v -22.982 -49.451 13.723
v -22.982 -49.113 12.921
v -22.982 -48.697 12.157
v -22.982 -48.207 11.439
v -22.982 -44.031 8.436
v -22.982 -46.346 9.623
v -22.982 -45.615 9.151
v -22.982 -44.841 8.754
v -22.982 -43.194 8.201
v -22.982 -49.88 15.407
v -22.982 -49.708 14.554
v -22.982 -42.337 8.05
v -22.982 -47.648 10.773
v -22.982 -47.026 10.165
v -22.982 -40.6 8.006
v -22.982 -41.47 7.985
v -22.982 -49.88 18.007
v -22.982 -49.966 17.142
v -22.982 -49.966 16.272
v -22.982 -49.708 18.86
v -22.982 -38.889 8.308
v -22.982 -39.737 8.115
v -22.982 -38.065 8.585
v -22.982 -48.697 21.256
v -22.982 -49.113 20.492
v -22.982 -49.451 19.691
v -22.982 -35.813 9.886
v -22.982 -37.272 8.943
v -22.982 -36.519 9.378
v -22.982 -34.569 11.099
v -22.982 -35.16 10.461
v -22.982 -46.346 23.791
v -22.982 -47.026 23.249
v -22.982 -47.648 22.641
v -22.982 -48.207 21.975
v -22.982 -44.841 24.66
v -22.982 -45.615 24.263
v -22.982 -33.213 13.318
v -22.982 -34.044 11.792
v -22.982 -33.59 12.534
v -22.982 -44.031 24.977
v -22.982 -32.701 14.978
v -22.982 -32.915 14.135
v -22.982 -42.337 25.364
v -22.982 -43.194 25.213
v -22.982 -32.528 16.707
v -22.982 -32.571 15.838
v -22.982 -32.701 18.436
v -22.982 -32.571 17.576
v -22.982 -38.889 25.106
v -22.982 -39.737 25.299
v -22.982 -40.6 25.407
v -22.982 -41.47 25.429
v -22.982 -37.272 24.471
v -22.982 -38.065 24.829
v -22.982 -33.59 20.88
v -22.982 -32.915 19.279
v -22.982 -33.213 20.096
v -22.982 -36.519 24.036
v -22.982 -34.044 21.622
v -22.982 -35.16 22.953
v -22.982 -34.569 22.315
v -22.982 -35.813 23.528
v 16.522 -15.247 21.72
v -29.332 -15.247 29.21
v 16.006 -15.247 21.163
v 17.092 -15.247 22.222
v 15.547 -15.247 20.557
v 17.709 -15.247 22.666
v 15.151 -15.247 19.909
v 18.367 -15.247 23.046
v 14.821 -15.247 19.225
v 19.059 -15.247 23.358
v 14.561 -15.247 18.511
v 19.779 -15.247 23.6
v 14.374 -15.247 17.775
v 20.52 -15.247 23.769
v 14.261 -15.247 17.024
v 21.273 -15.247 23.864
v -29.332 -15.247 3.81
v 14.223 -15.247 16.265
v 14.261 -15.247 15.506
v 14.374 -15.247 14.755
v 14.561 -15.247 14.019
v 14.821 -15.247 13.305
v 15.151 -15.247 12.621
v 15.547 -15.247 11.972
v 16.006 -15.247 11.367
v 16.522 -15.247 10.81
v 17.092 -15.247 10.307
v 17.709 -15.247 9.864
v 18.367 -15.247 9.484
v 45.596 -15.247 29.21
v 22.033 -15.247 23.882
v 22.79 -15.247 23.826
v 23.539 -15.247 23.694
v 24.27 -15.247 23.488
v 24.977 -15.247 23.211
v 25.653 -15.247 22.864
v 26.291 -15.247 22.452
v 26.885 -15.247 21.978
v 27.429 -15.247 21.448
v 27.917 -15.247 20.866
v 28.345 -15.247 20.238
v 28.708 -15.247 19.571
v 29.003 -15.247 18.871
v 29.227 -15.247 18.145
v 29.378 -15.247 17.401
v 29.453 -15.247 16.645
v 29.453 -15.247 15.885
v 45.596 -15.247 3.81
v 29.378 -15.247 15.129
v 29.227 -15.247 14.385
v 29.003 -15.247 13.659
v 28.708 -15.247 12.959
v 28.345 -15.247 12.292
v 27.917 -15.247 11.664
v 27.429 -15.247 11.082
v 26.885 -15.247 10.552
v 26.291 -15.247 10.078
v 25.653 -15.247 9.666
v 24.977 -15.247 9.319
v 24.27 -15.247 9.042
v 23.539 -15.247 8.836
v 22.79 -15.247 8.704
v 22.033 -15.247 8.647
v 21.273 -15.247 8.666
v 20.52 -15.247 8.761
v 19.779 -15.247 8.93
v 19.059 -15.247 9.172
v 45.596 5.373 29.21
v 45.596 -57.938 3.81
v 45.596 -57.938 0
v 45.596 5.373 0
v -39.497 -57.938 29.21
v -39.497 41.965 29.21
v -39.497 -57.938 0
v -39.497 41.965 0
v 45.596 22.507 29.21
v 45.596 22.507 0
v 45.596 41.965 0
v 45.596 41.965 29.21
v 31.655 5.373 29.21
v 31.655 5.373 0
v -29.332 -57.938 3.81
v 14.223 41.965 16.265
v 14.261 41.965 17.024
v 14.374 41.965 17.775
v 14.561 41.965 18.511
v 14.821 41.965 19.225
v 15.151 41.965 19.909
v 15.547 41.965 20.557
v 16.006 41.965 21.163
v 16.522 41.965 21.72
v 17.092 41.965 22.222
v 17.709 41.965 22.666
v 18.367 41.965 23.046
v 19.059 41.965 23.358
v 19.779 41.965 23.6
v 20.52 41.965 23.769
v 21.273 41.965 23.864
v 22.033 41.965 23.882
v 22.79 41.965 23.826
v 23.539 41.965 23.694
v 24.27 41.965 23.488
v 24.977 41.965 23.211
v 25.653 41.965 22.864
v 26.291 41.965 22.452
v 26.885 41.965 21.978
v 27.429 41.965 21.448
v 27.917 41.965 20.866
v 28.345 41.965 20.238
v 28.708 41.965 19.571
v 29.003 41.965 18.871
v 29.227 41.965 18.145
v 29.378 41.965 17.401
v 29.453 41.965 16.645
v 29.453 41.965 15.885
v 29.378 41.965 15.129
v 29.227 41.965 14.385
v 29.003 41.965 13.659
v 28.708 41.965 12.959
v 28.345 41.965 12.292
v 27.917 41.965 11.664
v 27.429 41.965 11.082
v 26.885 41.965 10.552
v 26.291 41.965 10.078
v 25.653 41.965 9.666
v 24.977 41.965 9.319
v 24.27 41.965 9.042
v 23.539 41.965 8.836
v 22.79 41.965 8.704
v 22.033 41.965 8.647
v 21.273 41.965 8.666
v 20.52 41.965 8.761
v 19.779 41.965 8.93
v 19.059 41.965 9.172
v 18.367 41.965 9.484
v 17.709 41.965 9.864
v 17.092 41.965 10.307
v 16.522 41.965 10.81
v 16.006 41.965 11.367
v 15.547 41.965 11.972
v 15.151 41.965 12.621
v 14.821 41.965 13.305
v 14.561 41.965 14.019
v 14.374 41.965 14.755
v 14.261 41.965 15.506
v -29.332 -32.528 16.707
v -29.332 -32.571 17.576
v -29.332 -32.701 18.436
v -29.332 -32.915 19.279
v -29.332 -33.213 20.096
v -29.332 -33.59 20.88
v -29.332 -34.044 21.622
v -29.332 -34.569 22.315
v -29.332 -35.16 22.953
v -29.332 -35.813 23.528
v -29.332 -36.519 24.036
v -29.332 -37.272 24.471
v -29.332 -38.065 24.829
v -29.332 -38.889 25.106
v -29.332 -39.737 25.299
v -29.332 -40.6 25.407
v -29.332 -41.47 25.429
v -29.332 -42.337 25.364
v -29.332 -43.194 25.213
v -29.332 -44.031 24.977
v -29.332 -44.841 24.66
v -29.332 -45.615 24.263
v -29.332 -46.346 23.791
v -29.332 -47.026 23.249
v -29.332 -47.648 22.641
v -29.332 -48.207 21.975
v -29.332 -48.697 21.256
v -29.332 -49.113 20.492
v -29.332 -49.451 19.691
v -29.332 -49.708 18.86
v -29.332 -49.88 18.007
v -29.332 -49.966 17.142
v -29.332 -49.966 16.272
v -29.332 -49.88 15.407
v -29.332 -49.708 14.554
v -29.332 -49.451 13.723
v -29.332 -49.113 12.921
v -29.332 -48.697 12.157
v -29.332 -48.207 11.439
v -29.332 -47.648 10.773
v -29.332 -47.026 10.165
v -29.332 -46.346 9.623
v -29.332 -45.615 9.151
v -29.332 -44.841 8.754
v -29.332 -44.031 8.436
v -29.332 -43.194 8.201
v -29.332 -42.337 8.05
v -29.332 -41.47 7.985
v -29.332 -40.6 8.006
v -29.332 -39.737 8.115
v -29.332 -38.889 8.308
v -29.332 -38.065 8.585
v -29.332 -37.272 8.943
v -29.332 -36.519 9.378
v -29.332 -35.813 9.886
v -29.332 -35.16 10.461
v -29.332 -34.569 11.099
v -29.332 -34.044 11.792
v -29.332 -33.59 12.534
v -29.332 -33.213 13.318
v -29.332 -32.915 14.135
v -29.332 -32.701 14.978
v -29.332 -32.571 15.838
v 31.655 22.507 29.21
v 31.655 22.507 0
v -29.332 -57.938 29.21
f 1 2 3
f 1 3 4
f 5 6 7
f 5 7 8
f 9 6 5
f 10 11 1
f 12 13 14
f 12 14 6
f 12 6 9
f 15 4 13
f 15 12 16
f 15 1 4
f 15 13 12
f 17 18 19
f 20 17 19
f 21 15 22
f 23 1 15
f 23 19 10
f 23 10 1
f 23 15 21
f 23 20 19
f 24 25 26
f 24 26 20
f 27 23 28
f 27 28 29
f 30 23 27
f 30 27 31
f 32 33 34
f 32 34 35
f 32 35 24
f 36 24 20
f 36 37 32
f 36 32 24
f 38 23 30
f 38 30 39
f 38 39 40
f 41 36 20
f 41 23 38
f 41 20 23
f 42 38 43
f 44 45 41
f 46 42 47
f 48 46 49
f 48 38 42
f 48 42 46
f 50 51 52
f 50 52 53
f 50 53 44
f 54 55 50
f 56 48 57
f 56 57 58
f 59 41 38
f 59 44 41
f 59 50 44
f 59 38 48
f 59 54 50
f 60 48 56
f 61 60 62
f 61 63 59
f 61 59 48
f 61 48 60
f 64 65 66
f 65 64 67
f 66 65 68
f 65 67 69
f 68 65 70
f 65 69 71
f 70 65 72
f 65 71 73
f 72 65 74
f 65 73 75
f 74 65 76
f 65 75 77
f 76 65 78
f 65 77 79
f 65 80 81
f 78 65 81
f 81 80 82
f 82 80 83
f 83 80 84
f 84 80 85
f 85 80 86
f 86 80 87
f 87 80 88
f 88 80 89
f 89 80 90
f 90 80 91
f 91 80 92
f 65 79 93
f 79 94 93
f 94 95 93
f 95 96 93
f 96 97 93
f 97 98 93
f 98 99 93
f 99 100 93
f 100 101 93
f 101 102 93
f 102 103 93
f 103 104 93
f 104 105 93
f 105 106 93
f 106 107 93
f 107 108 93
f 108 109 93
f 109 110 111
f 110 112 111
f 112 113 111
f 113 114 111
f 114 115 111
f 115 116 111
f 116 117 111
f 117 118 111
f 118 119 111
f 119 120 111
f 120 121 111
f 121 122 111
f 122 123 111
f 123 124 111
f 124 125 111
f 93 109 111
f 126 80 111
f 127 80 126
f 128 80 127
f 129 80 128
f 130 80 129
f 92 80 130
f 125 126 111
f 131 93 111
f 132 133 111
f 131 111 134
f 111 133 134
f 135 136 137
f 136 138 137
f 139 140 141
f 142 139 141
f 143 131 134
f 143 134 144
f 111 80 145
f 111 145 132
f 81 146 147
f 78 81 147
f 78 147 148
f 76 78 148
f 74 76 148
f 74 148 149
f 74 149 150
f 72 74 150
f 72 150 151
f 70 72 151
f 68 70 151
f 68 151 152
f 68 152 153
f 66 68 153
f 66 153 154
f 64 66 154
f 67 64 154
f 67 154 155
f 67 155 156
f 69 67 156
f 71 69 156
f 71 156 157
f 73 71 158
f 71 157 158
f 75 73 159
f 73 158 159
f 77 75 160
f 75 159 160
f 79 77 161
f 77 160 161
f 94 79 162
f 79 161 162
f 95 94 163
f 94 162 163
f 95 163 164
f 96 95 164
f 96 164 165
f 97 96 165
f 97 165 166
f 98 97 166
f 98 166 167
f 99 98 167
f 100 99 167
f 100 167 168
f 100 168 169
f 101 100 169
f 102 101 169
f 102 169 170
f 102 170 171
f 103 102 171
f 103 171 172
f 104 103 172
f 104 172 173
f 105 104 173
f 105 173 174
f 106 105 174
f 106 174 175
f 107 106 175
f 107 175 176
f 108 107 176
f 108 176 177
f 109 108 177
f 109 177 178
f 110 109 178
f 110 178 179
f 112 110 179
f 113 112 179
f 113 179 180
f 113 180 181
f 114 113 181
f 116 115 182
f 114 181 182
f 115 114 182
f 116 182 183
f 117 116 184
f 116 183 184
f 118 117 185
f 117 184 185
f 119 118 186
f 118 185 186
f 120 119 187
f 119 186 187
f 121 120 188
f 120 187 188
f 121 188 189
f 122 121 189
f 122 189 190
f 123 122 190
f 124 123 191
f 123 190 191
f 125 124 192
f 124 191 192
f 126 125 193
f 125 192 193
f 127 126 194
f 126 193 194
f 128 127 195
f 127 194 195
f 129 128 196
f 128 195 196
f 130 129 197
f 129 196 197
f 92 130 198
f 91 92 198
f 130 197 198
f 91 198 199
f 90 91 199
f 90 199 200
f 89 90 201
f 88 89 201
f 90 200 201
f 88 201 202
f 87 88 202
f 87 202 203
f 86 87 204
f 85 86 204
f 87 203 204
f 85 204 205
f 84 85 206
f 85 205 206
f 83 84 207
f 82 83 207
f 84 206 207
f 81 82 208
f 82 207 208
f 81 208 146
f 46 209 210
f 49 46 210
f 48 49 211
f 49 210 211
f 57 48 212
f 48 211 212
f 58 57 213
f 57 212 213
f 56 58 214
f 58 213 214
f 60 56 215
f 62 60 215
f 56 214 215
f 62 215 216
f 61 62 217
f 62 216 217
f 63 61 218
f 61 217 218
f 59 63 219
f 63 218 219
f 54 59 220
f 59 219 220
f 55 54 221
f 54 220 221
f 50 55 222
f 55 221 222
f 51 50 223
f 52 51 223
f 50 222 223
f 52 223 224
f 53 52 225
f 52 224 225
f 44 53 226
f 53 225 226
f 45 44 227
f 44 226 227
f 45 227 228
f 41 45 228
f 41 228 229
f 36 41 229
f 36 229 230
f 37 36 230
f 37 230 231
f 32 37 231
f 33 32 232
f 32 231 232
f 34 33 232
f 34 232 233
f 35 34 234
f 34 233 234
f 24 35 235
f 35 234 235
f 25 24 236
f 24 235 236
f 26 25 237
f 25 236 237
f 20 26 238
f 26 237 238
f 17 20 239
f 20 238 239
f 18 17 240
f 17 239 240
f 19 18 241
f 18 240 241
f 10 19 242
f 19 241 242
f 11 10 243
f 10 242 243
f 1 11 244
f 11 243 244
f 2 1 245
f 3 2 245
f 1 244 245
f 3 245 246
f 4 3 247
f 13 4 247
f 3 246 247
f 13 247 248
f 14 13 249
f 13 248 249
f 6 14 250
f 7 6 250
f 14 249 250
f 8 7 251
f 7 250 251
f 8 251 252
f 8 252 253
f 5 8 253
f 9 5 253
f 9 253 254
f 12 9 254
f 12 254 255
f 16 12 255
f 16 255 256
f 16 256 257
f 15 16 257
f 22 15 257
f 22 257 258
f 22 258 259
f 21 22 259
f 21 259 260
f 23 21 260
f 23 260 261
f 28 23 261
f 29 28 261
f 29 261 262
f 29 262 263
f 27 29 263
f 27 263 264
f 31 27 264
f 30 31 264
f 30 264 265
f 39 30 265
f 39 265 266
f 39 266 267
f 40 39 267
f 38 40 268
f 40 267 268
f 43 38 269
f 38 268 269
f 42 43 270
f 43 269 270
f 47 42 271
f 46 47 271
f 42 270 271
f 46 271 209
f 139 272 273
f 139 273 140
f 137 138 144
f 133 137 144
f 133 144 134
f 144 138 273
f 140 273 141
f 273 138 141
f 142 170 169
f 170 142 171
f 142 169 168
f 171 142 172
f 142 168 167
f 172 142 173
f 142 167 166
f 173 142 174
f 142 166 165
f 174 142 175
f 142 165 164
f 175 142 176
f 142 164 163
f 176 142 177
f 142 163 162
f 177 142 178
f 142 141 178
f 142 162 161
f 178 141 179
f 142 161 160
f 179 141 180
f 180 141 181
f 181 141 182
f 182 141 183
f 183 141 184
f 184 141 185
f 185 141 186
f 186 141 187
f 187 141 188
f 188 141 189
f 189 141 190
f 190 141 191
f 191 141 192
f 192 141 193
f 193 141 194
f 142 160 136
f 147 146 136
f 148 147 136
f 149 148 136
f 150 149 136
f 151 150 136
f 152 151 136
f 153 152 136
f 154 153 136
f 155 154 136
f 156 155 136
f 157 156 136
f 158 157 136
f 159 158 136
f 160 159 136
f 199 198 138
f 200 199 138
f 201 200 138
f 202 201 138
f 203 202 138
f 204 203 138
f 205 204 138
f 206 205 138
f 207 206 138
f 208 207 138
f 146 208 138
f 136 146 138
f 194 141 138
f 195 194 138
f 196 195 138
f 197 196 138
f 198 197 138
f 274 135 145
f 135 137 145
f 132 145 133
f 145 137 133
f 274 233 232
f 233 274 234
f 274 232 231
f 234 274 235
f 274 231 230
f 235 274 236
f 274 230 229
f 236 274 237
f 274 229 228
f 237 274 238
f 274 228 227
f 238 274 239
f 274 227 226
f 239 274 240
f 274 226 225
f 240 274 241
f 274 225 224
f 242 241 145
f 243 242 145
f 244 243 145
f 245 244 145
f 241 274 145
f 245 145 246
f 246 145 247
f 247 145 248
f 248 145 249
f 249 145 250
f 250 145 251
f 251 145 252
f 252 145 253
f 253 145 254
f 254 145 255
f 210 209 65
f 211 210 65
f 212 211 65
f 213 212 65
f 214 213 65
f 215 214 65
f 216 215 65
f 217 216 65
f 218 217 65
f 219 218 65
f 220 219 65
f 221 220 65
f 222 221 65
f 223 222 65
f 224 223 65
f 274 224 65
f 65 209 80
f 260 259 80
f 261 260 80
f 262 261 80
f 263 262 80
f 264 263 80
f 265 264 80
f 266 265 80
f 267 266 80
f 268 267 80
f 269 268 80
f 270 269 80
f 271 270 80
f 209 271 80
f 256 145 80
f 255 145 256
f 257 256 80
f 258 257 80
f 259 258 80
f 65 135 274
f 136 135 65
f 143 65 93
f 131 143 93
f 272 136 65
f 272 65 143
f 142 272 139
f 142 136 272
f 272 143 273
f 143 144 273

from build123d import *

# Parameters (mm, degrees)
F1_DEPTH = 3.81
F3_DEPTH = 25.4
F4_R     = 8.724849
F5_DEPTH = 6.35
F7_D     = 15.24


with BuildPart() as f1:
    # F0 (on Top) → F1 (new body)
    with BuildSketch(Plane.XY):
        Polygon((-39.496768, 41.965317), (-39.496768, 35.576135), (-39.496768, -57.938274), (45.595534, -57.938274), (45.595534, 5.372723), (31.655498, 5.372723), (31.655498, 22.507351), (45.595534, 22.507351), (45.595534, 41.965317), align=None)
    extrude(amount=F1_DEPTH)

    # F2 (on face) → F3 (join)
    with BuildSketch(Plane.XY.offset(3.81)):
        Polygon((45.595534, 41.965317), (-39.496768, 41.965317), (-39.496768, -57.938274), (-29.332161, -57.938274), (-29.332161, -15.246916), (45.595534, -15.246916), (45.595534, 5.372723), (31.655498, 5.372723), (31.655498, 22.507351), (45.595534, 22.507351), align=None)
    extrude(amount=F3_DEPTH)

    # F4 (on face) → F5 (join)
    with BuildSketch(Plane.YZ.offset(-29.332161)):
        with Locations((-41.252476, 16.706923)):
            Circle(F4_R)
    extrude(amount=F5_DEPTH)

    # F7 (through all)
    with Locations(Plane.XZ.offset(15.246916)):
        with Locations((21.842908, 16.264843)):
            Hole(F7_D / 2)


solid = f1.part
